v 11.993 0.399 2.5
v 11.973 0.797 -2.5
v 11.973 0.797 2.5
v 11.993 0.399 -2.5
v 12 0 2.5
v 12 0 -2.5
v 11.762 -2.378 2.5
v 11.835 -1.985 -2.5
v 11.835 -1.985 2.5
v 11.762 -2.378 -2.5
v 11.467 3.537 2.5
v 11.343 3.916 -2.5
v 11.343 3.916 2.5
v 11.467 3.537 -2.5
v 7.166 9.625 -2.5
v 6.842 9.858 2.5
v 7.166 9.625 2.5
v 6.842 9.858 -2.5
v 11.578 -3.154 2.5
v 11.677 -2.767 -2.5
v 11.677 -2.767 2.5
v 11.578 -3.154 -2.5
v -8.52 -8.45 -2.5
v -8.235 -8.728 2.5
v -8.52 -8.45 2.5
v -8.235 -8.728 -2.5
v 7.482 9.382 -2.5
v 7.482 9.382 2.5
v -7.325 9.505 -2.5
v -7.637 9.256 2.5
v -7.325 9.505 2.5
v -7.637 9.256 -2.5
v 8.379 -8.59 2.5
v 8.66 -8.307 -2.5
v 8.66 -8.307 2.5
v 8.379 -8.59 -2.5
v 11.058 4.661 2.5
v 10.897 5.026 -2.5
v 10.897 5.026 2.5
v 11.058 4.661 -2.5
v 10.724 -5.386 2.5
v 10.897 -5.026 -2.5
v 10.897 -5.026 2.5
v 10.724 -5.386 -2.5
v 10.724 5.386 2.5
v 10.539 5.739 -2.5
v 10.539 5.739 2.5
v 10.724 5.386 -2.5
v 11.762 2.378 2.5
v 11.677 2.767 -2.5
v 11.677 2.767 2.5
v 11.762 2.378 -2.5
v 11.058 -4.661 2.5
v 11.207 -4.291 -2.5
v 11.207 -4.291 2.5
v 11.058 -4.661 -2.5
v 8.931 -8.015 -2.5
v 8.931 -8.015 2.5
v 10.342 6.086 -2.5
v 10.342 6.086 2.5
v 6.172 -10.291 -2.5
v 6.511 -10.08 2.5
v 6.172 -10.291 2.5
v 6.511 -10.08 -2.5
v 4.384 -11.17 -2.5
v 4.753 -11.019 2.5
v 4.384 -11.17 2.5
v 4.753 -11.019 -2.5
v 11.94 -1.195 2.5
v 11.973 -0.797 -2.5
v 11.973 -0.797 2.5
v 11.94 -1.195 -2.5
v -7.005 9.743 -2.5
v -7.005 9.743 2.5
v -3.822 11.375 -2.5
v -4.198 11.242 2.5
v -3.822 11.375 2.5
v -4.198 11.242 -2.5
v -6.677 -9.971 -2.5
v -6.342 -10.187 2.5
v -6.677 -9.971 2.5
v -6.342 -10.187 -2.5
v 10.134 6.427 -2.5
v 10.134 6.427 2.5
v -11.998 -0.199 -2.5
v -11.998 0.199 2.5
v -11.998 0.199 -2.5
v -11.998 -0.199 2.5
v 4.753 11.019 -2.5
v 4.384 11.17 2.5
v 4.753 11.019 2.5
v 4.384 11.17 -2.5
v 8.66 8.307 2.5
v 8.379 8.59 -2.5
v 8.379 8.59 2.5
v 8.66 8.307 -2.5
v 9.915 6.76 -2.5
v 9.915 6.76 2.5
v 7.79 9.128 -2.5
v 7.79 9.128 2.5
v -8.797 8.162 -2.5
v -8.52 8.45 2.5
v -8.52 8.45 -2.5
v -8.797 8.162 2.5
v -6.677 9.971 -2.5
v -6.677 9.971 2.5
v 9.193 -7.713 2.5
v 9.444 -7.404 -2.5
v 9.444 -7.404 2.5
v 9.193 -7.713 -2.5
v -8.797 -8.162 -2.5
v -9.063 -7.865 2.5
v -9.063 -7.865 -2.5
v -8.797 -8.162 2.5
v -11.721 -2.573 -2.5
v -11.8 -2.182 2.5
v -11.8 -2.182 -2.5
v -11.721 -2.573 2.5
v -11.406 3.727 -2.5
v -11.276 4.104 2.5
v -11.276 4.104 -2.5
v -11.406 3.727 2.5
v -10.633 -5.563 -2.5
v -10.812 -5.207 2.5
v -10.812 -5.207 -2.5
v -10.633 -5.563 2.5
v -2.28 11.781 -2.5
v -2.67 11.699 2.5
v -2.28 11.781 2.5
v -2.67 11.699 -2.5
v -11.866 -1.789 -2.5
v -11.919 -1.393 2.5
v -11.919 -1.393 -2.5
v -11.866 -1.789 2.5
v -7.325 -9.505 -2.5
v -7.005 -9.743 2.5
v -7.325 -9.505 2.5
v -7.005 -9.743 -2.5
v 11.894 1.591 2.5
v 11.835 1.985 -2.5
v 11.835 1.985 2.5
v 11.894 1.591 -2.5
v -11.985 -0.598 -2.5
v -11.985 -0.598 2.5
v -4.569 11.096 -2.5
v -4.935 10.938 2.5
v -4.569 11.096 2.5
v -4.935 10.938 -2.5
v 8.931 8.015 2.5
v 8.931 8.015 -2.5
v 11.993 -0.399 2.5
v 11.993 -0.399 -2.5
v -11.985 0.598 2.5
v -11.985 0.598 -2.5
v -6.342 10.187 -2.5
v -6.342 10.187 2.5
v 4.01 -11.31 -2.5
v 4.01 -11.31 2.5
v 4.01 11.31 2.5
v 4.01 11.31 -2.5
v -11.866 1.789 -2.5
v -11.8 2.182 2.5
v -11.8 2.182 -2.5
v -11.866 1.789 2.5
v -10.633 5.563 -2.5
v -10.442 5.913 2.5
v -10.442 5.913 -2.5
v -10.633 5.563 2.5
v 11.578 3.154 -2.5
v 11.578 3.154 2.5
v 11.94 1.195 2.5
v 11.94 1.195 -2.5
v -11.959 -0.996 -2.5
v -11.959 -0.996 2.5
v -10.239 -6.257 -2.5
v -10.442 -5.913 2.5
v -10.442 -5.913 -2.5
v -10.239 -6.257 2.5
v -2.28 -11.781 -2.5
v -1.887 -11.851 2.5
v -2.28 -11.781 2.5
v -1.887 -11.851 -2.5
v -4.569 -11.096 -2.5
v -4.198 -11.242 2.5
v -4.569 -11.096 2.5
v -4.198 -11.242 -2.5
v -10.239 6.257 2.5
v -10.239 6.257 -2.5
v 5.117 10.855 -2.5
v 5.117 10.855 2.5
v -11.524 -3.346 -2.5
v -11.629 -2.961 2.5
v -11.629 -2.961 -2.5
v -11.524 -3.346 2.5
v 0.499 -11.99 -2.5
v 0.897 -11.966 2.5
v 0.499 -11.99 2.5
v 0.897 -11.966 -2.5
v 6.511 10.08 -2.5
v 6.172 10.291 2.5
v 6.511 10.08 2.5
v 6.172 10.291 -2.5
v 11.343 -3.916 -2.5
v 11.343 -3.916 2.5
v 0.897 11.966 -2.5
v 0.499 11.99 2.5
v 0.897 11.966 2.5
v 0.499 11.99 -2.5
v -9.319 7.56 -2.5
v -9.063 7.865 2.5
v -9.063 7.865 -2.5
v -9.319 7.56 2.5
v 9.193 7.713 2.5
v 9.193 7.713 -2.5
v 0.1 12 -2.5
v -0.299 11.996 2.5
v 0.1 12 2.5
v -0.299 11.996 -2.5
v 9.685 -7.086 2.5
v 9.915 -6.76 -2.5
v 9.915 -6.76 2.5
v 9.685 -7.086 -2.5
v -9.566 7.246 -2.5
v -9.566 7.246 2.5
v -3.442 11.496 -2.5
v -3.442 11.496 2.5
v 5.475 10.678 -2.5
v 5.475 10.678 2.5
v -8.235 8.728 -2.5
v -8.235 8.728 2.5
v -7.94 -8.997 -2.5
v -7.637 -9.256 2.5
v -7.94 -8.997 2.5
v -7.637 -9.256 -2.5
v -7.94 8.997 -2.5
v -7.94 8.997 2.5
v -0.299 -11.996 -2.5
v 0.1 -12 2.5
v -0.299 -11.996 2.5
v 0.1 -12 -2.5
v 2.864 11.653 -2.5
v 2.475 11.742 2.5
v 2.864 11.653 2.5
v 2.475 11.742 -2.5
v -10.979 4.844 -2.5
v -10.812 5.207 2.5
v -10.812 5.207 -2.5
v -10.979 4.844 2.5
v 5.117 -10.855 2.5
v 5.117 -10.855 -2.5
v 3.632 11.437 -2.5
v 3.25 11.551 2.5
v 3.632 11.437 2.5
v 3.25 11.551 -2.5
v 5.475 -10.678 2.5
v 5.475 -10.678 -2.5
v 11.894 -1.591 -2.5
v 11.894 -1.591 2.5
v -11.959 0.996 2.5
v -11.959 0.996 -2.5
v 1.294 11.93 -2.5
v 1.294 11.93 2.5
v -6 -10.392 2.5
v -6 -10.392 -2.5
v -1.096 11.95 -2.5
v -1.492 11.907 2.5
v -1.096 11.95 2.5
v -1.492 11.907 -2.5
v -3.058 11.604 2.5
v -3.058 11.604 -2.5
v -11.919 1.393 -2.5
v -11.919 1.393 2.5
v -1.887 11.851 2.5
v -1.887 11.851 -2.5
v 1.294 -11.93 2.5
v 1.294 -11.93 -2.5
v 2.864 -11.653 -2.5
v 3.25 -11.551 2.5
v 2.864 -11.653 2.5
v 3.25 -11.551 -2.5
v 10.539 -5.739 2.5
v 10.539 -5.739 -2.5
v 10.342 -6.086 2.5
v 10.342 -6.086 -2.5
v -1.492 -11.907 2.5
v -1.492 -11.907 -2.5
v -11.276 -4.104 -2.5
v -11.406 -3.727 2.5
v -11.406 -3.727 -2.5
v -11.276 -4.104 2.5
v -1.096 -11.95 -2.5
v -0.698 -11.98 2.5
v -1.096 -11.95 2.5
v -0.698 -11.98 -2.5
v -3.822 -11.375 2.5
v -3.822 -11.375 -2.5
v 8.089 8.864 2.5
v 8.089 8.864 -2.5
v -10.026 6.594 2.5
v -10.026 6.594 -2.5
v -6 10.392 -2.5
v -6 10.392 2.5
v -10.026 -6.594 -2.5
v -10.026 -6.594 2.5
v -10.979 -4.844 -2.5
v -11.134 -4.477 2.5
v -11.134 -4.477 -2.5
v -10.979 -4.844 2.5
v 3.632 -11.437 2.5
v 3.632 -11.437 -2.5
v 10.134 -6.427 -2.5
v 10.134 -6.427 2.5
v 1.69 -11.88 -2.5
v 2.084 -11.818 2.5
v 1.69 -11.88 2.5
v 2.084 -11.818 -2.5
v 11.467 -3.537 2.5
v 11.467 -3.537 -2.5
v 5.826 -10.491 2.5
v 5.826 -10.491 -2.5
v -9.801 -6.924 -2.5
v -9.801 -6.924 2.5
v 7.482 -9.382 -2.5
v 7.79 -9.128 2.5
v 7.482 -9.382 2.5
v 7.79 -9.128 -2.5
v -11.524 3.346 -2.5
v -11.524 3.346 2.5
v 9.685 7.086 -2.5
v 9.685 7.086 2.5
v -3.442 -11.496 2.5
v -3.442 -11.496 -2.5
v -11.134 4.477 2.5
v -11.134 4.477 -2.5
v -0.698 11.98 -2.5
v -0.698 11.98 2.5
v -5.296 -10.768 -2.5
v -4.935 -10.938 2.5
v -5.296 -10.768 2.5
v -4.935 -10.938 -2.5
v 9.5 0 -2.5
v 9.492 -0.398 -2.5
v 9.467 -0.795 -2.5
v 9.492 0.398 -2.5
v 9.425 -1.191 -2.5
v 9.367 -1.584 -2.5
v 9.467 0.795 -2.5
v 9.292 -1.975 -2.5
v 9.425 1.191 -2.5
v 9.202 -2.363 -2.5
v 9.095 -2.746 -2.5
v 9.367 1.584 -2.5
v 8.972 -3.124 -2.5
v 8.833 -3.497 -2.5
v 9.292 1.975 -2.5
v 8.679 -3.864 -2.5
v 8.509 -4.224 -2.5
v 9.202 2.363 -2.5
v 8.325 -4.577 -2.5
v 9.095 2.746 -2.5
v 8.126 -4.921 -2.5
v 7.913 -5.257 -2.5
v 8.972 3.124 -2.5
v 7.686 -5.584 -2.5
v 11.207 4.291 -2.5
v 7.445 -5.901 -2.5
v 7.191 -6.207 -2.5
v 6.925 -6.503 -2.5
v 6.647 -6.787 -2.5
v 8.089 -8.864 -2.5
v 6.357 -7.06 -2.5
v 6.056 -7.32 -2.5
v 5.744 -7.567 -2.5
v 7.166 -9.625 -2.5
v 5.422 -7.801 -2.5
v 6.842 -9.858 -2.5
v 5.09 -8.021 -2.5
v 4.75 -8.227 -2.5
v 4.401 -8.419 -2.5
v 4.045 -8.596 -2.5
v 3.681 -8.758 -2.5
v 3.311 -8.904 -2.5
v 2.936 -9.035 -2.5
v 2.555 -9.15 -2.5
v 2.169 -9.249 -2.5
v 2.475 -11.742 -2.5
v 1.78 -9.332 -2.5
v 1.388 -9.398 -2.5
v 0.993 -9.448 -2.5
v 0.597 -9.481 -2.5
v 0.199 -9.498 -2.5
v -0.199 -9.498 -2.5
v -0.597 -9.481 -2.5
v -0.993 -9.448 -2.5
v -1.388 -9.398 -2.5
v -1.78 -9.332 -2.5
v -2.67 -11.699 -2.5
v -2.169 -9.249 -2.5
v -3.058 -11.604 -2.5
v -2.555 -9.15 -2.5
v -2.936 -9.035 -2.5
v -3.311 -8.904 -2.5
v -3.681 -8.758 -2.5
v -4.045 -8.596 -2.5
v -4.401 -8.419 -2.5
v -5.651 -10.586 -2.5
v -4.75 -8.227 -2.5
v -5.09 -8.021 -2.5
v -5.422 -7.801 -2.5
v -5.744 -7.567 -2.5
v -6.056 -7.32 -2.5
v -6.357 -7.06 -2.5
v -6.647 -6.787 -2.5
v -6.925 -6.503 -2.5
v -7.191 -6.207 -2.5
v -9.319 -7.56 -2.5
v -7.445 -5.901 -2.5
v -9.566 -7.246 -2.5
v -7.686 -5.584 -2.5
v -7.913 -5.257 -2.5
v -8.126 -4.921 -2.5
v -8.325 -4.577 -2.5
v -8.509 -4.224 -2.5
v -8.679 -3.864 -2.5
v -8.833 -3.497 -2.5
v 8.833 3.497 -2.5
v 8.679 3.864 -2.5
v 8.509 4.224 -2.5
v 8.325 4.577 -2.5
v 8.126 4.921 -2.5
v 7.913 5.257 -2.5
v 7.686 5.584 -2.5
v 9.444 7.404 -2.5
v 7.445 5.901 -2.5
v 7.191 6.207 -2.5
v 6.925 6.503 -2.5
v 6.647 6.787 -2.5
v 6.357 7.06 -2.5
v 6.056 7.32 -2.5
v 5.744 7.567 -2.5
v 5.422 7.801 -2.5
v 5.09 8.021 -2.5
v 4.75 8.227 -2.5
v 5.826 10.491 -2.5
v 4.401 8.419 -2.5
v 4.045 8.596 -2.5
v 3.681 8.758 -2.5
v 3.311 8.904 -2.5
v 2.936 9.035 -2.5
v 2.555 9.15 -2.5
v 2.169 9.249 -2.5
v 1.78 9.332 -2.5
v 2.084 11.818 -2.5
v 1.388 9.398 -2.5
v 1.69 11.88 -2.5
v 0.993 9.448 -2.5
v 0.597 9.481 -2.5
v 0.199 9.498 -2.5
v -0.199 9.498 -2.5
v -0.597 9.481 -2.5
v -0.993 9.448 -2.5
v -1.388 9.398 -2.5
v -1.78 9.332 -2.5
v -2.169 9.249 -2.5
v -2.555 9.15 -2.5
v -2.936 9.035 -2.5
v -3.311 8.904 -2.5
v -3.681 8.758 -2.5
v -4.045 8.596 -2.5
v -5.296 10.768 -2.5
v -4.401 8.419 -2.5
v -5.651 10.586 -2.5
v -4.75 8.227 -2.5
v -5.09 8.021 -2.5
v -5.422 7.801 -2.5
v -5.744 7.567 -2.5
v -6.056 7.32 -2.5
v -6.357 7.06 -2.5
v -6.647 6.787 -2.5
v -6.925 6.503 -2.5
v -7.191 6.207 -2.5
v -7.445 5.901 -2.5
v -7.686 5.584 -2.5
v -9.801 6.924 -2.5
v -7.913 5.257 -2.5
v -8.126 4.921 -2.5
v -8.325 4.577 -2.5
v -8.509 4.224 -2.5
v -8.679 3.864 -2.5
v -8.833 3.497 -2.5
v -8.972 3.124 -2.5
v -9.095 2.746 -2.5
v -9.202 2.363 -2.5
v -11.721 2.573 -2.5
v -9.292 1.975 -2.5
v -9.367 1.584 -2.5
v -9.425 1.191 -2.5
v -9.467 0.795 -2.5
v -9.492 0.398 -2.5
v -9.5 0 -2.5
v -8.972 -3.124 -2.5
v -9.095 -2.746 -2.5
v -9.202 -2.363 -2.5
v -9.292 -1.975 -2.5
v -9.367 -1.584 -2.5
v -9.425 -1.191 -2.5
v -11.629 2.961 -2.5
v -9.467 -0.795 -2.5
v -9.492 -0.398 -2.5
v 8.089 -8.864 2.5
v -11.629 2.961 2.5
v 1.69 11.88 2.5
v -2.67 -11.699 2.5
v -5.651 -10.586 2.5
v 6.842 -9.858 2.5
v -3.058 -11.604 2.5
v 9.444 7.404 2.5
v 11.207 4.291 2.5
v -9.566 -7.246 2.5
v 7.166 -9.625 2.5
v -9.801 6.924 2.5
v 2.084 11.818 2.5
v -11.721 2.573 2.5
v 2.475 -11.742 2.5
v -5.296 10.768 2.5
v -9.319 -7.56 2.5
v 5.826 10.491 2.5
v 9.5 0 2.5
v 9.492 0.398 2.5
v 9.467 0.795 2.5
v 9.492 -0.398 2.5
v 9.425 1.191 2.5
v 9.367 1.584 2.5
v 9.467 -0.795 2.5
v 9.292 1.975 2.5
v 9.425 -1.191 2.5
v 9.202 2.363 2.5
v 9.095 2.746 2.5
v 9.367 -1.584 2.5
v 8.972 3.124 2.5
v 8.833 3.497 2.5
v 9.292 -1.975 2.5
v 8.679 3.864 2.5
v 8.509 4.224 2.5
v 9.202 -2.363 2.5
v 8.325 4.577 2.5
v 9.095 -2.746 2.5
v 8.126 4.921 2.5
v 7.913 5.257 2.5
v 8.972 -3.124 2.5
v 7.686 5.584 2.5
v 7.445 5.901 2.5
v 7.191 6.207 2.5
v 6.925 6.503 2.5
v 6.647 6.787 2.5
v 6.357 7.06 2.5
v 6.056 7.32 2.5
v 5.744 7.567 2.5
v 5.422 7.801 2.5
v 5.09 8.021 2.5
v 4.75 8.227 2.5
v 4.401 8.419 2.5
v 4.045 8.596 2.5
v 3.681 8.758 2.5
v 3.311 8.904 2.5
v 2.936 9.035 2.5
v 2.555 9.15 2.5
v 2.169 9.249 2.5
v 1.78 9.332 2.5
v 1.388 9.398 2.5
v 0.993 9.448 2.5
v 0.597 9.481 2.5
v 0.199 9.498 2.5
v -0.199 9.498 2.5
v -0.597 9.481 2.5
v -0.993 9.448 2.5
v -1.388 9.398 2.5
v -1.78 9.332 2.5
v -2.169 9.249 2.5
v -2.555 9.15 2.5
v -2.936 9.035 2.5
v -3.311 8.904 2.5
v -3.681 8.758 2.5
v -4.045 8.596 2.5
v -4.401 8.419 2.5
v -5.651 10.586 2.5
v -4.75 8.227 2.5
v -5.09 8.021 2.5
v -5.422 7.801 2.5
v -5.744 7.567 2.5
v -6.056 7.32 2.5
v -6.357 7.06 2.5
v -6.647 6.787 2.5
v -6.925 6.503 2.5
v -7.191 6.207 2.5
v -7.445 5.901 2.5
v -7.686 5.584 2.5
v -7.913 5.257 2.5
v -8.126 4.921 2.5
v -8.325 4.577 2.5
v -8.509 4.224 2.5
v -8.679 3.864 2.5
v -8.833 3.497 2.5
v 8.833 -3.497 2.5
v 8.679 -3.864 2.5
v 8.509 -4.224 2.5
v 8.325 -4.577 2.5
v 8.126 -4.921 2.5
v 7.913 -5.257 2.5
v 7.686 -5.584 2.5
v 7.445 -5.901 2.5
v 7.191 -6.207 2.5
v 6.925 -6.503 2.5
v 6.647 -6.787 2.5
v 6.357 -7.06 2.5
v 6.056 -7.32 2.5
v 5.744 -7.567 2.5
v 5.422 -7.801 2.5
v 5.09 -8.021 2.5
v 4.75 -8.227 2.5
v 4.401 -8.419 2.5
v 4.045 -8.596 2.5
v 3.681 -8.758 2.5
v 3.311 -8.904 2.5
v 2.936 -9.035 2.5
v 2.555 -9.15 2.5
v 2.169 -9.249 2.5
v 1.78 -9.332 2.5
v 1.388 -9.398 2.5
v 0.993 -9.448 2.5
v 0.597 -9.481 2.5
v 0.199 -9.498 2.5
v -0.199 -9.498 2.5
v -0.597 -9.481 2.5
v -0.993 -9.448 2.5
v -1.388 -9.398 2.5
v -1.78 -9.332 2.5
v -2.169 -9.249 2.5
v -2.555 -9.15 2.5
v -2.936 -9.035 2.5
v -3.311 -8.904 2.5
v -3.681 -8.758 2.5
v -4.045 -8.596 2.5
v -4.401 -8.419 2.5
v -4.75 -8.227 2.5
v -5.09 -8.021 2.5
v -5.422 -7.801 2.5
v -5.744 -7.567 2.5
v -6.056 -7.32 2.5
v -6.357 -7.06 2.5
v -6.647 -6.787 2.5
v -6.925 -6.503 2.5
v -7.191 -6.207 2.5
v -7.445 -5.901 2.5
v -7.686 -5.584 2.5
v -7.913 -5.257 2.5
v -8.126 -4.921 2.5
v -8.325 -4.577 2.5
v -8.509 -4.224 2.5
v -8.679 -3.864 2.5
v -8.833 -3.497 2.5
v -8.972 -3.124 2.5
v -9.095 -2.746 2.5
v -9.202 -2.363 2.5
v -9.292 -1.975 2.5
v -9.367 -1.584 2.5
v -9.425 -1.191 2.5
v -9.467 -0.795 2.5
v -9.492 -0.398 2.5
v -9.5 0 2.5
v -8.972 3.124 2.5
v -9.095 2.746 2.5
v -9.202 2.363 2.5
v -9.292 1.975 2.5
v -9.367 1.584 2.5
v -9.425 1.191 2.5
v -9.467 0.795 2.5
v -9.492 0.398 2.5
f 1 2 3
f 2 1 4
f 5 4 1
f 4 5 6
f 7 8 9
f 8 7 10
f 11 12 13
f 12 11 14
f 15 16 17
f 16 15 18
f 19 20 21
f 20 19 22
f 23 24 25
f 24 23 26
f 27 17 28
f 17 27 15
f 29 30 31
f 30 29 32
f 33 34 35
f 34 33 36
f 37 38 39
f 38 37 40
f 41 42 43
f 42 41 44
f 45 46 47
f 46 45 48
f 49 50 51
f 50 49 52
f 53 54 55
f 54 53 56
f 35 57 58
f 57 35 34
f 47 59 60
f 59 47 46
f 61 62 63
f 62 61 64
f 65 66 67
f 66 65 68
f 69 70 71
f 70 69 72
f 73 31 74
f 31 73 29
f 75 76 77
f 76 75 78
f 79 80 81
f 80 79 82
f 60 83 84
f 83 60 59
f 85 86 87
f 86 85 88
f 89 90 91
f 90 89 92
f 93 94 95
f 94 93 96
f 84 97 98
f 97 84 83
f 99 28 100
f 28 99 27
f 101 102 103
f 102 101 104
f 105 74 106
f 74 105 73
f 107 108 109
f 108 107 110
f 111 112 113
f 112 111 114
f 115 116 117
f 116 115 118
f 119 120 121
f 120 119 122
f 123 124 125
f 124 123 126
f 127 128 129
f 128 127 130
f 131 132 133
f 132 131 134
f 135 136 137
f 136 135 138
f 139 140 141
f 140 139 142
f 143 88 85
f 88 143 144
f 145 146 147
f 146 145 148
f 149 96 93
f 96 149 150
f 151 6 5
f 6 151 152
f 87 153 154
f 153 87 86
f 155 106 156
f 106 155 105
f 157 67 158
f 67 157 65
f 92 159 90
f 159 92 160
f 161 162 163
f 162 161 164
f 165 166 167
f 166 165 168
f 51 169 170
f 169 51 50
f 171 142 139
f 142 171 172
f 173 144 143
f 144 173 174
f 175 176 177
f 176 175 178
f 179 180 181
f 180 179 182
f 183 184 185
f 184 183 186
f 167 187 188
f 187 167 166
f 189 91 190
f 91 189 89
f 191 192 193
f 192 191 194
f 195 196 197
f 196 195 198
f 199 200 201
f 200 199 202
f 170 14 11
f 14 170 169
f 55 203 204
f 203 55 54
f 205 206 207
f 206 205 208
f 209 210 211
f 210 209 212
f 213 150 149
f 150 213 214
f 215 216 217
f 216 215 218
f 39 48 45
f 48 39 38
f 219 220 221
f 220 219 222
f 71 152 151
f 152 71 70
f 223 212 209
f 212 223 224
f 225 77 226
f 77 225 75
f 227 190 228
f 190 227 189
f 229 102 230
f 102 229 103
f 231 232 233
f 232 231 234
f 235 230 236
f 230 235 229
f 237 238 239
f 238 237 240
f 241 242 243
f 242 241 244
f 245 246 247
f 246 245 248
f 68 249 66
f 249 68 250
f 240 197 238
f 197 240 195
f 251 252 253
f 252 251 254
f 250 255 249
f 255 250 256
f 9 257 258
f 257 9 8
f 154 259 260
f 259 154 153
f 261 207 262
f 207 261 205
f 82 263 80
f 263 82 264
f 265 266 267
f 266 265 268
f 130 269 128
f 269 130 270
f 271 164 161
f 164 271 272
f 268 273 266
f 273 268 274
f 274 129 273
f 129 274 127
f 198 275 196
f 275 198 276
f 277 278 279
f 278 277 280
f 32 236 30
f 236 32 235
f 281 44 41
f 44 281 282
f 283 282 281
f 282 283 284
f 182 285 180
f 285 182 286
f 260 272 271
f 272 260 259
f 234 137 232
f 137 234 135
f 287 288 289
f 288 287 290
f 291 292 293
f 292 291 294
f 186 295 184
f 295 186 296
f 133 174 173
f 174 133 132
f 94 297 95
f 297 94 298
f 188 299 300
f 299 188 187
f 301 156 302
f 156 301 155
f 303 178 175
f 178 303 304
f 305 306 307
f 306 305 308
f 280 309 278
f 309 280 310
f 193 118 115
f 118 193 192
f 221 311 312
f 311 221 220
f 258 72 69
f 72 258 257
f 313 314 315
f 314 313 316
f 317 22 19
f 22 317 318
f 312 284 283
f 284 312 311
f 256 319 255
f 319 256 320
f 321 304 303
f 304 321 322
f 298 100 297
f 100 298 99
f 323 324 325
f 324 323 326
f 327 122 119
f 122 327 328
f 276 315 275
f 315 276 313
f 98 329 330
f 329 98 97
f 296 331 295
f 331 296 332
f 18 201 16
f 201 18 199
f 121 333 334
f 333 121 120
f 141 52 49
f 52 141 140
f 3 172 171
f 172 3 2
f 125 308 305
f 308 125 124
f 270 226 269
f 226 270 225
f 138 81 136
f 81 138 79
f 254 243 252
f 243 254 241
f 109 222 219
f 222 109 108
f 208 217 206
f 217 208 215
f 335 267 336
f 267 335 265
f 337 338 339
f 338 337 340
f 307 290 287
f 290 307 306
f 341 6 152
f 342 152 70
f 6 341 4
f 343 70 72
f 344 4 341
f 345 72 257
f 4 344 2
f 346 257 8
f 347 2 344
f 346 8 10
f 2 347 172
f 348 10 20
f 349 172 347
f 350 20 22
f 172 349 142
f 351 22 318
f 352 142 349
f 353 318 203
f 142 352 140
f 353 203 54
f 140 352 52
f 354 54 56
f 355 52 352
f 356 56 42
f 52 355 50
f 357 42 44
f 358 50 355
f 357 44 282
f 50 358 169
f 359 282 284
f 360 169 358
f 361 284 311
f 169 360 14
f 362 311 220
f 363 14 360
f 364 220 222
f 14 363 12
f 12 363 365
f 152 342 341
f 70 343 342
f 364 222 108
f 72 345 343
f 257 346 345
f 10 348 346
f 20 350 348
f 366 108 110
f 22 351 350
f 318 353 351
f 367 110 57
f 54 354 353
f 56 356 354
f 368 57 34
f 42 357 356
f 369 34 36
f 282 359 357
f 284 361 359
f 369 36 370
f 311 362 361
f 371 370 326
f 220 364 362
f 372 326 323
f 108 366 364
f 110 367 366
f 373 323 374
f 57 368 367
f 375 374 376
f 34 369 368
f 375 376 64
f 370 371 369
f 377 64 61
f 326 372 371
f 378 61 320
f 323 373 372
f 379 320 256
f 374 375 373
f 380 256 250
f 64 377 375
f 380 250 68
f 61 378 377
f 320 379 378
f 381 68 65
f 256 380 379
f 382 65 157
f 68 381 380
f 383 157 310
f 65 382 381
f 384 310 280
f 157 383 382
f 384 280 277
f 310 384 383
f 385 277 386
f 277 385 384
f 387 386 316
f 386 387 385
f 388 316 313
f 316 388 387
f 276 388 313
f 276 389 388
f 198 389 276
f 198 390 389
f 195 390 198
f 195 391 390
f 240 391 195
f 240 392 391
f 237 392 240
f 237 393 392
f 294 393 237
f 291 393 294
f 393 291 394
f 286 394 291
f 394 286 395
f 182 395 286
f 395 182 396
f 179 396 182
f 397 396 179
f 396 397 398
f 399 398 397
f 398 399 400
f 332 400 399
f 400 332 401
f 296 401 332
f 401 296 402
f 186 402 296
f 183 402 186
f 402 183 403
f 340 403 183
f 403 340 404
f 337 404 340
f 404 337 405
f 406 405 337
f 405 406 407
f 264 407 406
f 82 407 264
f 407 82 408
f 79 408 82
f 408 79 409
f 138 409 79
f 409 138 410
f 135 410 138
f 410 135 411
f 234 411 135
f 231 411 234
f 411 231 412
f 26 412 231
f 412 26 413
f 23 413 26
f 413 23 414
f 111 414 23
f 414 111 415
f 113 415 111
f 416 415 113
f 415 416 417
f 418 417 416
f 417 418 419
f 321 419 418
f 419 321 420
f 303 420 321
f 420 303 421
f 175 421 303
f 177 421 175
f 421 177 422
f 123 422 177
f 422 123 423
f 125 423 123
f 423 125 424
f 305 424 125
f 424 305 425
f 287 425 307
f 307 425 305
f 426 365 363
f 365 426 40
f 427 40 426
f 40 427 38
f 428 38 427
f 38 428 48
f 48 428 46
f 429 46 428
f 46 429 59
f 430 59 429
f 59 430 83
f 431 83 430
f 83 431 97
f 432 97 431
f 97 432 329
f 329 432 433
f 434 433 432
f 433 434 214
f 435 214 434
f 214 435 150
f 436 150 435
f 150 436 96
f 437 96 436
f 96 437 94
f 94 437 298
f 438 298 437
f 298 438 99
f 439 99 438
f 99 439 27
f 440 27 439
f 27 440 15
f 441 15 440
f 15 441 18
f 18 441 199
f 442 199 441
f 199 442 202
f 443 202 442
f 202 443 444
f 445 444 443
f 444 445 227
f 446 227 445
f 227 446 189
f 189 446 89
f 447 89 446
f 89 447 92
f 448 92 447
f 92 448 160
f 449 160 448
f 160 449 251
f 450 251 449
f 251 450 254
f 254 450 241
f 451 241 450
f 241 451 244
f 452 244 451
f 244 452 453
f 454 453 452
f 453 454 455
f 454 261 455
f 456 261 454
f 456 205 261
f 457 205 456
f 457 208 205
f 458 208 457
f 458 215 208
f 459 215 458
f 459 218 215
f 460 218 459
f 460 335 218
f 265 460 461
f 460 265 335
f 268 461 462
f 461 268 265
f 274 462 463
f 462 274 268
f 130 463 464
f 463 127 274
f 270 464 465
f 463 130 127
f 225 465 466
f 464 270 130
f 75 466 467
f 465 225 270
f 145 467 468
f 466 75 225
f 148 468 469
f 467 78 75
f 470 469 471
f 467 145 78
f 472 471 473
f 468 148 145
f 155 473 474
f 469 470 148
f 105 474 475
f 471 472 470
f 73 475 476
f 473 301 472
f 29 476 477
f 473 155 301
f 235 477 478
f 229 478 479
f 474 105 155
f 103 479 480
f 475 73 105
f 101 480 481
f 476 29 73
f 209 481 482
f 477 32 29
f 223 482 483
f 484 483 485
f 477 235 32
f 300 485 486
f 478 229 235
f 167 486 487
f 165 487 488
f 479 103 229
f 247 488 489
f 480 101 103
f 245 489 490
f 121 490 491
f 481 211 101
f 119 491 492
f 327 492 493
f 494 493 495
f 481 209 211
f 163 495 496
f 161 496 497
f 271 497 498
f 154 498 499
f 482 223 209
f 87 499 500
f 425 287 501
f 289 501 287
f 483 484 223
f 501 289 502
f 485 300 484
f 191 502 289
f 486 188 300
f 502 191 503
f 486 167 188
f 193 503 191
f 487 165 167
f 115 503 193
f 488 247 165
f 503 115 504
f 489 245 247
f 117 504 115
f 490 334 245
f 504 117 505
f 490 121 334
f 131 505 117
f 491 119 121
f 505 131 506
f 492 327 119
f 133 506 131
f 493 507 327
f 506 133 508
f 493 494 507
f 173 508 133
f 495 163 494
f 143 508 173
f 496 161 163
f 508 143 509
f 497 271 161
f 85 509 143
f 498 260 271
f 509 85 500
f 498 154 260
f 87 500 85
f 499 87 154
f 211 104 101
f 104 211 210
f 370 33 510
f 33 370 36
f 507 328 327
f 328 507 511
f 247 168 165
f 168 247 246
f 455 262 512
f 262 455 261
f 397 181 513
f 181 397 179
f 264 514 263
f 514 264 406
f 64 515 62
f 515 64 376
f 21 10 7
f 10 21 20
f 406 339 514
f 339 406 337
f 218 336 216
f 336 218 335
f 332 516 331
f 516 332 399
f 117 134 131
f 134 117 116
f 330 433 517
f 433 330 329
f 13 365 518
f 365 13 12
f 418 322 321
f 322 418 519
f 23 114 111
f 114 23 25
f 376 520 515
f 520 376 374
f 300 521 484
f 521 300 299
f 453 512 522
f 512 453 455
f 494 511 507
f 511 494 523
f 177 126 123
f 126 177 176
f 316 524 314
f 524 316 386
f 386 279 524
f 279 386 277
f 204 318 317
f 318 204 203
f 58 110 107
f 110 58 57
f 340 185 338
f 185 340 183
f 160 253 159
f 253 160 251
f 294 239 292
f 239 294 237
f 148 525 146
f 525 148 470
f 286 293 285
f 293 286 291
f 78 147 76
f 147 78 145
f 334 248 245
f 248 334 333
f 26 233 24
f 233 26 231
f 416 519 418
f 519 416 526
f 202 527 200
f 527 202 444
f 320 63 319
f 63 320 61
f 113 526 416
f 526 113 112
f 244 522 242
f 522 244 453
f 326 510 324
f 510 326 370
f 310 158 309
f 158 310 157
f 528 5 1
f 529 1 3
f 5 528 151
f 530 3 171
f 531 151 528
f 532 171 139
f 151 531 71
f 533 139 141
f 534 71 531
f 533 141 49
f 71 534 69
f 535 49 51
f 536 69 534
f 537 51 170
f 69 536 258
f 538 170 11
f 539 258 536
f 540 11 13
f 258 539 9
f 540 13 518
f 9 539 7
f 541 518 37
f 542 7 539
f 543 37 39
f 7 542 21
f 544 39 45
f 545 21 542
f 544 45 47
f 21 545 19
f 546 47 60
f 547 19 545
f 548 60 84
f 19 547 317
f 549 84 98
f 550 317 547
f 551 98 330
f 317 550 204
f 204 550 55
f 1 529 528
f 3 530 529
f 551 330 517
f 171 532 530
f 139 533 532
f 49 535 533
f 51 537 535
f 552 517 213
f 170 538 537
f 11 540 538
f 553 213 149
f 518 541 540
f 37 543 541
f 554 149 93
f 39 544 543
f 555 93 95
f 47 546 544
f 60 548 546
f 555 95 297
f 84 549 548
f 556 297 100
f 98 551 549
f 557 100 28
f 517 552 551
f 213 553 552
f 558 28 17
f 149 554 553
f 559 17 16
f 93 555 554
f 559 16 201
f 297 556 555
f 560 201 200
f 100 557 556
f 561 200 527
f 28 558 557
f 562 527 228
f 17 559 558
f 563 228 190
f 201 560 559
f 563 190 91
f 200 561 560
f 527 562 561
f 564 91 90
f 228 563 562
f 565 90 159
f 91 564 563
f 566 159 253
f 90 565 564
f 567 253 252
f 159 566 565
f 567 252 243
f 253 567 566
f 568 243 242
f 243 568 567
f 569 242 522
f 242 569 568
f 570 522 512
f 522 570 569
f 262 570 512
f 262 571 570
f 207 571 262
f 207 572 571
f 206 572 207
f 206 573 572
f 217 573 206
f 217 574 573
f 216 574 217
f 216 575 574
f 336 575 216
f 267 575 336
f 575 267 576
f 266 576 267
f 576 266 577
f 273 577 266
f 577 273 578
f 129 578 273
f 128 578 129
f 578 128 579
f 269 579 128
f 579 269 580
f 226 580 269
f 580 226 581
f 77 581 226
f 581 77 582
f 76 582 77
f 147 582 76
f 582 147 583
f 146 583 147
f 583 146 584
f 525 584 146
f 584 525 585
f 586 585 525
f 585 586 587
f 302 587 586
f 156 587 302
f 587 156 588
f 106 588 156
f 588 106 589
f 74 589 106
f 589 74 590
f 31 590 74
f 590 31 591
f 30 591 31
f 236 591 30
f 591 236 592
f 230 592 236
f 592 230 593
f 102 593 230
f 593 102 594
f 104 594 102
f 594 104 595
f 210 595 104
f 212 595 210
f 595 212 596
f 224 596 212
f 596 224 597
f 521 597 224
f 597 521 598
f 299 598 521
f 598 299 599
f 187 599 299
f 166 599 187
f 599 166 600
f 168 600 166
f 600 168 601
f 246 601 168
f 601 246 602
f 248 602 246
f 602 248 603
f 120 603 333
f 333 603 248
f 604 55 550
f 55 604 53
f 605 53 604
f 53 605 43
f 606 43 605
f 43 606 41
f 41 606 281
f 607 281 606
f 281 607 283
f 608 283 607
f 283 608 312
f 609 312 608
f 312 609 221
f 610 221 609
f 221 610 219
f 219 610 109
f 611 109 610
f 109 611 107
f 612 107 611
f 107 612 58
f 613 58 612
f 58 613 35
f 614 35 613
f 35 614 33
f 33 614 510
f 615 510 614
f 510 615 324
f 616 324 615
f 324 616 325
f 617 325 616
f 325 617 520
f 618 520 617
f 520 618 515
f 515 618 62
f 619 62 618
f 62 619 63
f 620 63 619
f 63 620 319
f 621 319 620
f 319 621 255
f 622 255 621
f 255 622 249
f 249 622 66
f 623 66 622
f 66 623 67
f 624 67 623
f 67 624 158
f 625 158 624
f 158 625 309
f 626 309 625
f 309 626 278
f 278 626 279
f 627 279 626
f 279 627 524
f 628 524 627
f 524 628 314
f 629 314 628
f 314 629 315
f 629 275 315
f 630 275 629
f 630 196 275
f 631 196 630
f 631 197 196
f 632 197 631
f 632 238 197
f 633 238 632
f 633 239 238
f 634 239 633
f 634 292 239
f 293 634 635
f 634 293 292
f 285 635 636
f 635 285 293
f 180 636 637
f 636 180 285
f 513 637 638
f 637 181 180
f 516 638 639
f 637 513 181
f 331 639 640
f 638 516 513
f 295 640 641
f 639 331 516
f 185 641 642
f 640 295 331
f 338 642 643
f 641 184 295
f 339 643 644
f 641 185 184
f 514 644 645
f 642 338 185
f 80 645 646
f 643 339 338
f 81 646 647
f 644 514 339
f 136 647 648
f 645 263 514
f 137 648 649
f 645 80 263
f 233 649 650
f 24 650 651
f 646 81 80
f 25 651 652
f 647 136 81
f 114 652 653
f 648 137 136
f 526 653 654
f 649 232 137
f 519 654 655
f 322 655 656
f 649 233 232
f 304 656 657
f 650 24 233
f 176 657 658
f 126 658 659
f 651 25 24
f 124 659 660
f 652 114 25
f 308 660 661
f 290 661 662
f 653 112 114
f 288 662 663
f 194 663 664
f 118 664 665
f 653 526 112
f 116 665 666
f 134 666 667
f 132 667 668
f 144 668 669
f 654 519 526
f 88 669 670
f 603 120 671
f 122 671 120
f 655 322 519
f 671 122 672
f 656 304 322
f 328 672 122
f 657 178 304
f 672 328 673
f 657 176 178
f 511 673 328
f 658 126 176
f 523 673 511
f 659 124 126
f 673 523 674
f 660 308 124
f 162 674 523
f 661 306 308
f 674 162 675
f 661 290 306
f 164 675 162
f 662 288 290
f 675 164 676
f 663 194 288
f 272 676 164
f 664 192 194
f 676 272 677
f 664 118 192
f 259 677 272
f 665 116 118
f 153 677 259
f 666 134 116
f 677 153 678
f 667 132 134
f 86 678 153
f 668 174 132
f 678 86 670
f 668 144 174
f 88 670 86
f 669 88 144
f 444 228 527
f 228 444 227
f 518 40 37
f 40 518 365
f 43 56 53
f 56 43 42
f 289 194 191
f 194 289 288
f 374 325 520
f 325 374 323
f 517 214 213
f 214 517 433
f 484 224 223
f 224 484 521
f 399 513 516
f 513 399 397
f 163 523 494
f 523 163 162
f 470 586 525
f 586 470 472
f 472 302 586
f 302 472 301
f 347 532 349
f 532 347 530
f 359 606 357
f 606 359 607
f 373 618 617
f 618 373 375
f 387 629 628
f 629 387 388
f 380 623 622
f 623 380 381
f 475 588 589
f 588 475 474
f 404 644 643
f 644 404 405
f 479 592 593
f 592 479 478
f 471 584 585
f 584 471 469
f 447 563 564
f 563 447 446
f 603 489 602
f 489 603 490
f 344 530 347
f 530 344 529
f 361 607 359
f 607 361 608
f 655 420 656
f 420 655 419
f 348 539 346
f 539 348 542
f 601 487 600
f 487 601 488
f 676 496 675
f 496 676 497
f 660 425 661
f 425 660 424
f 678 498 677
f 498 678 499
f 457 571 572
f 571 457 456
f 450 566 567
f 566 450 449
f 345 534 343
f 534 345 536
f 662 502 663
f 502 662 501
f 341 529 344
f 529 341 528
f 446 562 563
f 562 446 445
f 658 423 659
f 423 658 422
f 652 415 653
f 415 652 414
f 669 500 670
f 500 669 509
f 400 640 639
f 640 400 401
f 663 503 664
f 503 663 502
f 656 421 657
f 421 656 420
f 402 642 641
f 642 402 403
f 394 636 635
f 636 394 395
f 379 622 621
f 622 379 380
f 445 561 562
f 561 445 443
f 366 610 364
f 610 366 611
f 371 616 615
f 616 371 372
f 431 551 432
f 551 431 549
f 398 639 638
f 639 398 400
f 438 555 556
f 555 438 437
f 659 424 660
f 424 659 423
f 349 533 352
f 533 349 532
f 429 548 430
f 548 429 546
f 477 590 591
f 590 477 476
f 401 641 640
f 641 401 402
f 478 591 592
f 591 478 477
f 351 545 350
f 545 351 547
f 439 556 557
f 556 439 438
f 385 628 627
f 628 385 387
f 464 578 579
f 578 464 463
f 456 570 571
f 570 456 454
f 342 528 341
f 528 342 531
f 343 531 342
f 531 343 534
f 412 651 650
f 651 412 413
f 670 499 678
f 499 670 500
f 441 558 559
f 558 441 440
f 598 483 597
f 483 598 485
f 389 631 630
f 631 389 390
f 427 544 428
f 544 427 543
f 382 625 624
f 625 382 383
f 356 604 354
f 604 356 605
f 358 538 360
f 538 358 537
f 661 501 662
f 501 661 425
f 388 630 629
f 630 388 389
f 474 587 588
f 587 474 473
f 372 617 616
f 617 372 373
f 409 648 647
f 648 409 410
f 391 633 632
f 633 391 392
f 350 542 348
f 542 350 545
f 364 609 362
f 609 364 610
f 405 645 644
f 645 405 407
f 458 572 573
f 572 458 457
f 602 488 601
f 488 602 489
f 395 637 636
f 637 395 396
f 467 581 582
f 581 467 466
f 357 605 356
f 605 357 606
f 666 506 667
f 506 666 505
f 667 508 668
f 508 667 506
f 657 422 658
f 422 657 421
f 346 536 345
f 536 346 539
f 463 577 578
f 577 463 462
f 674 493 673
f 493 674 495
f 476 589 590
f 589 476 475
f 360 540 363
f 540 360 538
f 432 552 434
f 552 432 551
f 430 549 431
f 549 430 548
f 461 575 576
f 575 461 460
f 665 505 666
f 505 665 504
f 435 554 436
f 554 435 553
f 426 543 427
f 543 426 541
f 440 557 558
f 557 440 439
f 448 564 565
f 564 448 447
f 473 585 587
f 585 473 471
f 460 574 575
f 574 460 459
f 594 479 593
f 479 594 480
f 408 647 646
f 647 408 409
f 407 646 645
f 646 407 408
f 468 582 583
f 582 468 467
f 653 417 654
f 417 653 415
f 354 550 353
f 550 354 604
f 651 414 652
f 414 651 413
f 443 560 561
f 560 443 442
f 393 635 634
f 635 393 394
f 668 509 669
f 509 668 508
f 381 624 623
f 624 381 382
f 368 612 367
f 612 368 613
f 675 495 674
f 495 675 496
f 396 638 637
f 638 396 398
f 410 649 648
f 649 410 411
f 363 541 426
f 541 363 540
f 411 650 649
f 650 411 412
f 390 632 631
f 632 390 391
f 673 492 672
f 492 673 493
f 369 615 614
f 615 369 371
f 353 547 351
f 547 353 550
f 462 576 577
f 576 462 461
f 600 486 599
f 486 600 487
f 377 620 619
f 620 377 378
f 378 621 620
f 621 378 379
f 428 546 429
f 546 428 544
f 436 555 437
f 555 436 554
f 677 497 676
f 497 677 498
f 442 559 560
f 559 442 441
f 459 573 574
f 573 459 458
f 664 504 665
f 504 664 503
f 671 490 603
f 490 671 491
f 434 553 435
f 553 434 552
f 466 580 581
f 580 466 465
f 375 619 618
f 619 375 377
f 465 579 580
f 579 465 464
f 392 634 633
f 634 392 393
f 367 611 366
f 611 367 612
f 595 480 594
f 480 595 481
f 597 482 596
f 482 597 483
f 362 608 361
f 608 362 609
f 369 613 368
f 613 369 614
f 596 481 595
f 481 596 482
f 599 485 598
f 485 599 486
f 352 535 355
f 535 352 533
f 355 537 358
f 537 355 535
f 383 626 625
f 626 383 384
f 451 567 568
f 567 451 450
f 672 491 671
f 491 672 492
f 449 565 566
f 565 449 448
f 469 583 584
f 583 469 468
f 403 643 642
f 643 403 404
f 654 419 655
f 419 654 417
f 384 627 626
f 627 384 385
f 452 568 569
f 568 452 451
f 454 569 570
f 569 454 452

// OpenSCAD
module spoked_wheel(radius=12, width=5, thickness=5, number_of_spokes=7, spoke_radius=1.5) {
        
    // Ring
    inner_radius = radius - thickness/2;
    difference() {
        cylinder(h=width,r=radius,center=true);
        cylinder(h=width + 1,r=inner_radius,center=true);
    }
}
$fa = 1;
$fs = 0.4;
spoked_wheel();
